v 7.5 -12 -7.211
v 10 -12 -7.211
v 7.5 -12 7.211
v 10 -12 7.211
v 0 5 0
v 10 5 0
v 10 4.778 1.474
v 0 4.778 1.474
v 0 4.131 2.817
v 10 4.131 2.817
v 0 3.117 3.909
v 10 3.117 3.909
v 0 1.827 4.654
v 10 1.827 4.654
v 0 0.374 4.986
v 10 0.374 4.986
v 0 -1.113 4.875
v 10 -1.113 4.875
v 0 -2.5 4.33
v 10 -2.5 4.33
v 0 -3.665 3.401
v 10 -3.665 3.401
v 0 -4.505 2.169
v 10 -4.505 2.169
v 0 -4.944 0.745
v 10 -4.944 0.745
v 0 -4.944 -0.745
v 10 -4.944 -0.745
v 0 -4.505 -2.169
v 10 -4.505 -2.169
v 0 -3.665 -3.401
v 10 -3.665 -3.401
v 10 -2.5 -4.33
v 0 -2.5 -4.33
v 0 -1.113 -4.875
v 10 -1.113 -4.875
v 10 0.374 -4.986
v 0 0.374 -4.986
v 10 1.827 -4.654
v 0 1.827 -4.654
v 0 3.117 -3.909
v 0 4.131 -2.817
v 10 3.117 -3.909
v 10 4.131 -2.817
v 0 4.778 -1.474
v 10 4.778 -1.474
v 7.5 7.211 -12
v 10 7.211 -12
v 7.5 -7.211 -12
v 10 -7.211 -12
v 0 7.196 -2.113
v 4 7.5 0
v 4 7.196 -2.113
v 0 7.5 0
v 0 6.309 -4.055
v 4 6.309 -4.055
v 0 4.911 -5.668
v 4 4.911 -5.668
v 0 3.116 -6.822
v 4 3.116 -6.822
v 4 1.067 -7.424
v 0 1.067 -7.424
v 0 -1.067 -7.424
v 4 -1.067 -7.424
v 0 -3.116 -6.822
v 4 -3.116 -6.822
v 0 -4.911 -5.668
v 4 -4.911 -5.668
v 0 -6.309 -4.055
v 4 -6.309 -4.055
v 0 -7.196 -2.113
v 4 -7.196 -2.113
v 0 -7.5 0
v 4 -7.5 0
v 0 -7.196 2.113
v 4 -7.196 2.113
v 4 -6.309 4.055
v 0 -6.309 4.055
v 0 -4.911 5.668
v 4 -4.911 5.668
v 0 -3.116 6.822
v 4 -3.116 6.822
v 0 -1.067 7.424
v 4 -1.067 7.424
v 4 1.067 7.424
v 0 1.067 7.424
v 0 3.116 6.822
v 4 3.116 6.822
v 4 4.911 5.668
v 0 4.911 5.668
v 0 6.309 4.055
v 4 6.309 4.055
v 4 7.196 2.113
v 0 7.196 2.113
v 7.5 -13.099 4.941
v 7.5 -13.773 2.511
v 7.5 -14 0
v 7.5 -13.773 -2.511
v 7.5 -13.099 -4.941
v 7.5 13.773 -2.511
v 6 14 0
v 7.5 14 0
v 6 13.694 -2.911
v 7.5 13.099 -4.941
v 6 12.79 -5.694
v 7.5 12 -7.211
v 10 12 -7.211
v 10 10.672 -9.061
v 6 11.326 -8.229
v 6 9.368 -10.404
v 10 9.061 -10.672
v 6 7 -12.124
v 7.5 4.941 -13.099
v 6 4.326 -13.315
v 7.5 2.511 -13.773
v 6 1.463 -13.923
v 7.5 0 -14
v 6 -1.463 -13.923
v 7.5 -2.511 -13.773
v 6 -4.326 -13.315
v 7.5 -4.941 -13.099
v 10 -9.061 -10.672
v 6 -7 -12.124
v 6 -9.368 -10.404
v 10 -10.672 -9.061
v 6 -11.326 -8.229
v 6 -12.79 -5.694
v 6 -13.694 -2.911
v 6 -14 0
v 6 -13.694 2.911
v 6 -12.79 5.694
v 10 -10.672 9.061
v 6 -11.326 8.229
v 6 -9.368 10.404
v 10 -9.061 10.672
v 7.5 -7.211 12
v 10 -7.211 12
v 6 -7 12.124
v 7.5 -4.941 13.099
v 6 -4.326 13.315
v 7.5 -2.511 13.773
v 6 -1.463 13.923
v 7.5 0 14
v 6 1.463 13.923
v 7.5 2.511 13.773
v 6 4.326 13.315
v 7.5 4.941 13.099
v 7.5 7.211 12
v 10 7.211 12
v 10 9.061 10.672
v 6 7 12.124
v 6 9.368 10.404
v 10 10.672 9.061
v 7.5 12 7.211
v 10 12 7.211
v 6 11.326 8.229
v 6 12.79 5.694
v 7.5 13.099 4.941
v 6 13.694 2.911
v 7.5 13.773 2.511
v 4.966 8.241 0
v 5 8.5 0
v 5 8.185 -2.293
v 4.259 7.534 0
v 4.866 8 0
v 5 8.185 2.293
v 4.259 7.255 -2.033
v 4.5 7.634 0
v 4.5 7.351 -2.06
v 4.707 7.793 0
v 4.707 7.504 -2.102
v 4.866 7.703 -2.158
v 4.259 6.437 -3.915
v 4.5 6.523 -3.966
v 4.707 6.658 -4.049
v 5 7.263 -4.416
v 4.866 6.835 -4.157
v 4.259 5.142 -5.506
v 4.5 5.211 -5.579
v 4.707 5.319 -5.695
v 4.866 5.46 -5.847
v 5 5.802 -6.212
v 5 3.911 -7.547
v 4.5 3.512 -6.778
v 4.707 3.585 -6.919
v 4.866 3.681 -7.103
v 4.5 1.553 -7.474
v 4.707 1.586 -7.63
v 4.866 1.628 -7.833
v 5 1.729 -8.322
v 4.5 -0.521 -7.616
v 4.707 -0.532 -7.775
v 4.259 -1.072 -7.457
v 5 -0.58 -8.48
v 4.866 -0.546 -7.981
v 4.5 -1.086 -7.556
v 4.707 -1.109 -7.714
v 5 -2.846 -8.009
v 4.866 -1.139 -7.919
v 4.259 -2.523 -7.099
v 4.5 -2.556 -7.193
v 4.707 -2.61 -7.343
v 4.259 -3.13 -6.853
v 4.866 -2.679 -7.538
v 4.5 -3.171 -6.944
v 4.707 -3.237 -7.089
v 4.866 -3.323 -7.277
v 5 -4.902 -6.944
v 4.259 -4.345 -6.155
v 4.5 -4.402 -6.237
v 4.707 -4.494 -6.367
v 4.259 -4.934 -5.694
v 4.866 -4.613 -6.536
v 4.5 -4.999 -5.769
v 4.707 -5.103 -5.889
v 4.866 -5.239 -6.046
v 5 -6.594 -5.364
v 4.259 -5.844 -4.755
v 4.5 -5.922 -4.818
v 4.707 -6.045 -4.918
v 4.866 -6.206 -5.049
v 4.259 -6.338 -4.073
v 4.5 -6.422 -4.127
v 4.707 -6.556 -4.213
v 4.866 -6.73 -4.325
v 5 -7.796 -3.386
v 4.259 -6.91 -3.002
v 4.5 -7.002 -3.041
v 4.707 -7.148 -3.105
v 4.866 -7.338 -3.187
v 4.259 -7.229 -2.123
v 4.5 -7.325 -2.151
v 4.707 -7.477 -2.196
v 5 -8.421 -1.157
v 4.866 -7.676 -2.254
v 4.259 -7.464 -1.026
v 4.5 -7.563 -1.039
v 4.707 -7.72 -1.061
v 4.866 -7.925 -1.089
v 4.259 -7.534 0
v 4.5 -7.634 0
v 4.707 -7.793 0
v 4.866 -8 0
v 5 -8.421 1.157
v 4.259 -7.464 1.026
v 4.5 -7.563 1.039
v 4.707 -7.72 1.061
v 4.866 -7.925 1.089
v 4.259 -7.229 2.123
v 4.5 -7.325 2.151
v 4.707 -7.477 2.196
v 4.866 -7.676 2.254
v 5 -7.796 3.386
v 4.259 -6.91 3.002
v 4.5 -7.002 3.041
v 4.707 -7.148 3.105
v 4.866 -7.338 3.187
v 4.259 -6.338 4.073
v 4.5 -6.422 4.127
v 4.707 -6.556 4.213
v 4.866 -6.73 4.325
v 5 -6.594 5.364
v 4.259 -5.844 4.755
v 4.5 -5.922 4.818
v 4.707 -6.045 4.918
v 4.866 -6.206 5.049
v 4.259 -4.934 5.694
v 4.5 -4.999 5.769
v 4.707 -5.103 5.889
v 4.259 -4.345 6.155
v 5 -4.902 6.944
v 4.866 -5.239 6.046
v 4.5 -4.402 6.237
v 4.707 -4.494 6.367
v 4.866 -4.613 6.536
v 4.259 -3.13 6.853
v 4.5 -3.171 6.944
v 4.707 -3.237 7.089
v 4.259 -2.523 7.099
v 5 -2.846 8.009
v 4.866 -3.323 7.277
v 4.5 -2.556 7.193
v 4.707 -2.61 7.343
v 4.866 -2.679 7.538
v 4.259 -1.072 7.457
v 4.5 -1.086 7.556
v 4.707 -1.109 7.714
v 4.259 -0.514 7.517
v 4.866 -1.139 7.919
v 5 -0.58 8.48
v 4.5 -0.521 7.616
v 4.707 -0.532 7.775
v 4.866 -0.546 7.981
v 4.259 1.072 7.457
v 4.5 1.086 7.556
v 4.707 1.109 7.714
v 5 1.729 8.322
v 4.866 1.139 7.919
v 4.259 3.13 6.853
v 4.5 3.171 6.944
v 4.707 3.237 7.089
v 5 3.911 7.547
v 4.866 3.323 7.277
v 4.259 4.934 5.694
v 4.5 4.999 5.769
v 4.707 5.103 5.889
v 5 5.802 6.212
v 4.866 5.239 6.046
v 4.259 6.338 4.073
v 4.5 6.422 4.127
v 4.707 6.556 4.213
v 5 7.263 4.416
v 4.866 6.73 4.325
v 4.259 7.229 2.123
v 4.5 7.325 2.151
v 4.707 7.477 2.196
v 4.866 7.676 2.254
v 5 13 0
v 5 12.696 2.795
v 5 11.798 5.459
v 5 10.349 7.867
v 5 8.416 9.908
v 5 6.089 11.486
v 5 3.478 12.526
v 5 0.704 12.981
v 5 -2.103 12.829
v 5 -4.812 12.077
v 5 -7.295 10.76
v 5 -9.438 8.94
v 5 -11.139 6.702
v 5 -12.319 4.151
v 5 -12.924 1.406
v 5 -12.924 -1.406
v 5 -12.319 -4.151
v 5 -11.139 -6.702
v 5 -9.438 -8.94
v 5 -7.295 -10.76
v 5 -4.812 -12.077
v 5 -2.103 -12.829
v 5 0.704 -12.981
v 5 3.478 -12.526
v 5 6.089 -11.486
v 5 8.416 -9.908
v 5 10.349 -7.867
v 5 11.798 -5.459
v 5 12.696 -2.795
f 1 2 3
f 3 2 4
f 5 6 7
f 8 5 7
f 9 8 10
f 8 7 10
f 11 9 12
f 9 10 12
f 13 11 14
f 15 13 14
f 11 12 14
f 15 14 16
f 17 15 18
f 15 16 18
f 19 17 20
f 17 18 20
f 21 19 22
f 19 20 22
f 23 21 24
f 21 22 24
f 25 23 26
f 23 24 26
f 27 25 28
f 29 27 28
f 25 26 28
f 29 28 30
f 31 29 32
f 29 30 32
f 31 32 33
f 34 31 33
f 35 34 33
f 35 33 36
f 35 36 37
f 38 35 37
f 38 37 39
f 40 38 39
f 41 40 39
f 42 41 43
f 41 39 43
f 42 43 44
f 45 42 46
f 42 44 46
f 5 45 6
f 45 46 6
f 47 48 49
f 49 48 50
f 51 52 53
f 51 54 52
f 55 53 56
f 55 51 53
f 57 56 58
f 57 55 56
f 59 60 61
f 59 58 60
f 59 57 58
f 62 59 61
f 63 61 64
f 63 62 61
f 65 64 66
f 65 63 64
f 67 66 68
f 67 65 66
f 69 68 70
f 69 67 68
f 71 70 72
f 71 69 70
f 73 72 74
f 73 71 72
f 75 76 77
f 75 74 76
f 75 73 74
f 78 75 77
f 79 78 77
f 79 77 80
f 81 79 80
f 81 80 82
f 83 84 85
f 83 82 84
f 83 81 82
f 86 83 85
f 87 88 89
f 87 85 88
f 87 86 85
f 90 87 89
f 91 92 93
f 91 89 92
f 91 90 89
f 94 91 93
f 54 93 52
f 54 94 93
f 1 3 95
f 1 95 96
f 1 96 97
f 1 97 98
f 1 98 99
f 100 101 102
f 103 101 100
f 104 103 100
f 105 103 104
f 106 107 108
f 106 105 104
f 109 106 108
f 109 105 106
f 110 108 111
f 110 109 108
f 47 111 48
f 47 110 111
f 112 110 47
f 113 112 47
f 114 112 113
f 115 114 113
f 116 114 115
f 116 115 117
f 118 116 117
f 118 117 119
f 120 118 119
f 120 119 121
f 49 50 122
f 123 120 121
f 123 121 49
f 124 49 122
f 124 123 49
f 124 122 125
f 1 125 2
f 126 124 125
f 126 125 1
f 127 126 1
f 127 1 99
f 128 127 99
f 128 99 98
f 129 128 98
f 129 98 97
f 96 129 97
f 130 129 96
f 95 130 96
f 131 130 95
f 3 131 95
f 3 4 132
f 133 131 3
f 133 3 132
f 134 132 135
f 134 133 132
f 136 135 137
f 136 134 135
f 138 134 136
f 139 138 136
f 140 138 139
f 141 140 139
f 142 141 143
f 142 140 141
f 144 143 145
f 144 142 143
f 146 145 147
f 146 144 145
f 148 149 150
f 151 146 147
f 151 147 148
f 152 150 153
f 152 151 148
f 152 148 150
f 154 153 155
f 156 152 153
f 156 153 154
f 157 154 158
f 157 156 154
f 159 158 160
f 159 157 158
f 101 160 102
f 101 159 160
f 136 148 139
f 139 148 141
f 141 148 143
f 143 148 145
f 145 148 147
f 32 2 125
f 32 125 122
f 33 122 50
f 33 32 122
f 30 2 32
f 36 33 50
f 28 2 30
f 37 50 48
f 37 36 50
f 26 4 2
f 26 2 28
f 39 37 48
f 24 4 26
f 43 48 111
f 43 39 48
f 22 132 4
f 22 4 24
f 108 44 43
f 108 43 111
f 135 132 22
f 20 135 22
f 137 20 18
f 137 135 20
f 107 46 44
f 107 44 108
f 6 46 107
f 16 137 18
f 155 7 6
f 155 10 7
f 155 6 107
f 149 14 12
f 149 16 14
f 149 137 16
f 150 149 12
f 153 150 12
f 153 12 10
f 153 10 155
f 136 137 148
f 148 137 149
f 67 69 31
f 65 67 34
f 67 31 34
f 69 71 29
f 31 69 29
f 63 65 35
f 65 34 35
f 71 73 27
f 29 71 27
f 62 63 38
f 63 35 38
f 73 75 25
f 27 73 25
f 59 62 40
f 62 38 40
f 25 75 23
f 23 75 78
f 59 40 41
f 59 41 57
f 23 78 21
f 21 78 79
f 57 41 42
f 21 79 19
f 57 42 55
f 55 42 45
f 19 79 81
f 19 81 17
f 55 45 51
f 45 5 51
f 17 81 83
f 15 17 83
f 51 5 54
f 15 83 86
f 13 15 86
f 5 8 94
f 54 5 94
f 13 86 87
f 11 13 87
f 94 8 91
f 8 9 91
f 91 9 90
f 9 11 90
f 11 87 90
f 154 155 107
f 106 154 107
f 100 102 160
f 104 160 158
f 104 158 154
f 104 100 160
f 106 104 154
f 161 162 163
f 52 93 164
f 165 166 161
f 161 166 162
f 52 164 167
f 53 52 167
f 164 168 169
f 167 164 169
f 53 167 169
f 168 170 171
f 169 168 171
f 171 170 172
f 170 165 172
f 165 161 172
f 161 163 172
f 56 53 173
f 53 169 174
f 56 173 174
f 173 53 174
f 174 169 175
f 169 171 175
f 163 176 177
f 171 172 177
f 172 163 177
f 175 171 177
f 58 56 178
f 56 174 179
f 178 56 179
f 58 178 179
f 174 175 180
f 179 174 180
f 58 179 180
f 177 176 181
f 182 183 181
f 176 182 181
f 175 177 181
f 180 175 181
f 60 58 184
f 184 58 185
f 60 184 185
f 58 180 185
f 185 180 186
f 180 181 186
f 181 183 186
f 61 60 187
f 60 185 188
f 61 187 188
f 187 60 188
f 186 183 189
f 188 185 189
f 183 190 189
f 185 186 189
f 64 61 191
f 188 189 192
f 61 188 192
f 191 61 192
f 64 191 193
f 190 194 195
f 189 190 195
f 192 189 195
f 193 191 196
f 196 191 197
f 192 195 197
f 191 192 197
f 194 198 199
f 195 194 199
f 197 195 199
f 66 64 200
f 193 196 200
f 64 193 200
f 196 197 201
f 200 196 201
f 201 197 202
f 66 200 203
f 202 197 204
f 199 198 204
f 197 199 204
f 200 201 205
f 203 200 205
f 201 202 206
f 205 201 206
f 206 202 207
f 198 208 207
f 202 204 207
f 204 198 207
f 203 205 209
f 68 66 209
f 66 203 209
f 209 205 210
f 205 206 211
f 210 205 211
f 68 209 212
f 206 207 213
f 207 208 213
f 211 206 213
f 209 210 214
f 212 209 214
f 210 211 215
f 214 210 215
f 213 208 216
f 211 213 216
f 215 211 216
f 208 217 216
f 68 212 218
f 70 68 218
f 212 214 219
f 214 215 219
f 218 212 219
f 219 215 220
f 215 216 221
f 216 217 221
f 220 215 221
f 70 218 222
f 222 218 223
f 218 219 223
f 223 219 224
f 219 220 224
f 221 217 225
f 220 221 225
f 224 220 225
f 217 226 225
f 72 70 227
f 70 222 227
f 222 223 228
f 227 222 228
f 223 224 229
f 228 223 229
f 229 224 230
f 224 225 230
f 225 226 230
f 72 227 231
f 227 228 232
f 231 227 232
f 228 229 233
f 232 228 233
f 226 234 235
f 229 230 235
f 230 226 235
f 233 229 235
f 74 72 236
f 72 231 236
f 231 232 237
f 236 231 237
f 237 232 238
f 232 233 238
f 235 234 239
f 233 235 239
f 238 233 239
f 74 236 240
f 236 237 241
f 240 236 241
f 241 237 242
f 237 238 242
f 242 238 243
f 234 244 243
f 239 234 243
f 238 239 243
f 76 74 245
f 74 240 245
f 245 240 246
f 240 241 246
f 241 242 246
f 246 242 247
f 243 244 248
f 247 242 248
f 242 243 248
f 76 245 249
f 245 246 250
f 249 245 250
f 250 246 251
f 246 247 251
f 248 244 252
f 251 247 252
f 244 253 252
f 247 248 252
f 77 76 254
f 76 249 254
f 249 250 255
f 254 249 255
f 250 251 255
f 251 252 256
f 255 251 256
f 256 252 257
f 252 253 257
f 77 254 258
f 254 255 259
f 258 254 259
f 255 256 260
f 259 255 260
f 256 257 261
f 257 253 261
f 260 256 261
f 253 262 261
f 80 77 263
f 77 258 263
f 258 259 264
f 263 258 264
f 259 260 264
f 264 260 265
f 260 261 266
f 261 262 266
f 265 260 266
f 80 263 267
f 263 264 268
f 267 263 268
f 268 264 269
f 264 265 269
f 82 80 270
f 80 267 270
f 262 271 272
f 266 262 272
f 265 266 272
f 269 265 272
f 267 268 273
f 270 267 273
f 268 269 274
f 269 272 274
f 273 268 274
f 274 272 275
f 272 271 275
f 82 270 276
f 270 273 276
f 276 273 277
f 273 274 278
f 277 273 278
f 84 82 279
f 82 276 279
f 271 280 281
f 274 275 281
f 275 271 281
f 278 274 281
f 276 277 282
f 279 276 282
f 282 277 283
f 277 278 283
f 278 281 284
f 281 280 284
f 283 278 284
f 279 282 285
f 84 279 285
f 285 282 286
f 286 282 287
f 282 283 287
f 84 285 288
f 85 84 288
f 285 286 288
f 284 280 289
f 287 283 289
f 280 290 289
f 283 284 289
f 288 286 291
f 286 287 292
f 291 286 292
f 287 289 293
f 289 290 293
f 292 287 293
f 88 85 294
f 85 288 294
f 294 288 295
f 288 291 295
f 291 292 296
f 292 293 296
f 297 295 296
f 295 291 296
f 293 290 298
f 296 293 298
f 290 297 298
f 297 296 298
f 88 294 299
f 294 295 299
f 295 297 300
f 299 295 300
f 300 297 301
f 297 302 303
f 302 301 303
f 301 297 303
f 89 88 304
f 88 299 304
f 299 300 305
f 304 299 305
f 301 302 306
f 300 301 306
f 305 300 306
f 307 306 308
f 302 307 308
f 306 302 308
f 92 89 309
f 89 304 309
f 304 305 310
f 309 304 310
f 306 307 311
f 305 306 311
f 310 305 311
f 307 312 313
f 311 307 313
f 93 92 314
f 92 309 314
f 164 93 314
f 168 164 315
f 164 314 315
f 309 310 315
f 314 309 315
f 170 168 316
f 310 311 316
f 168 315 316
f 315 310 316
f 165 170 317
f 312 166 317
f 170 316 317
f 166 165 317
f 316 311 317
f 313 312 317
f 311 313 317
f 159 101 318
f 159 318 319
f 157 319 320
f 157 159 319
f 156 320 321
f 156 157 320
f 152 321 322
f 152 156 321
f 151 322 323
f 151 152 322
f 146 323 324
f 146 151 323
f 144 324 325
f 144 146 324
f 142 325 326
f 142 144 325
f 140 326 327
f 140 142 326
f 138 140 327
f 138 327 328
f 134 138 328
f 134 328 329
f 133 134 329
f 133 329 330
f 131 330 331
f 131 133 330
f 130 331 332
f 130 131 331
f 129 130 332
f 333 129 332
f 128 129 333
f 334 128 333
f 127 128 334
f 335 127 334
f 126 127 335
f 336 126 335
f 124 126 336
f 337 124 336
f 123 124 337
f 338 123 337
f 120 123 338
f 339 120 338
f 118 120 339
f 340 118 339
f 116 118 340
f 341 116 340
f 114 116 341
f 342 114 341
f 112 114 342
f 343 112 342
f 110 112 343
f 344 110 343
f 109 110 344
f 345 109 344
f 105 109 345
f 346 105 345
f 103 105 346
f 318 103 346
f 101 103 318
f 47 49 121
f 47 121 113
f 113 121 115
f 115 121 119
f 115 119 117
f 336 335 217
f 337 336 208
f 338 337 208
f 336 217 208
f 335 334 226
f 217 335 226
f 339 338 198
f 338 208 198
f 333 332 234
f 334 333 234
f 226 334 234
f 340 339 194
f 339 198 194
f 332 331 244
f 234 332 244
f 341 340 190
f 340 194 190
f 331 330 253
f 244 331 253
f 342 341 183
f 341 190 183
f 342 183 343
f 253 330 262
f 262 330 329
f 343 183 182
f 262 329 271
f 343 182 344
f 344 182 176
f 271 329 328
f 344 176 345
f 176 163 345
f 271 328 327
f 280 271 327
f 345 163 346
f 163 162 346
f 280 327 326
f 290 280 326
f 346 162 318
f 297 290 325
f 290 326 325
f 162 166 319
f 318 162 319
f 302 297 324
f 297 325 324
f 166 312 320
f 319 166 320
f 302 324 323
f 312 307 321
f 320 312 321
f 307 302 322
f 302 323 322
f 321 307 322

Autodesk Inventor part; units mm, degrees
ref_plane "YZ Plane" through (0, 0, 0) normal (1, 0, 0) x (0, 1, 0)
ref_plane "XZ Plane" through (0, 0, 0) normal (0, 1, 0) x (-1, 0, 0)
ref_plane "XY Plane" through (0, 0, 0) normal (0, 0, 1) x (1, 0, 0)
sketch "Boceto1" plane through (0, 0, 0) normal (0, 0, 1) x (1, 0, 0)
  line L0 (0, 0) -> (11.3785, 0)
  line L1 (0, 5) -> (10, 5)
  line L2 (10, 5) -> (10, 14)
  line L3 (10, 14) -> (5, 14)
  line L4 (5, 14) -> (5, 7.5)
  line L5 (5, 7.5) -> (0, 7.5)
  line L6 (0, 7.5) -> (0, 5)
  dimension "d0" = 5
  dimension "d1" = 5
  dimension "d3" = 28
  dimension "d4" = 15
  dimension "d5" = 10
revolve "Revolución1" add sketch "Boceto1" angle 360 about axis through (0, 0, 0) along (1, 0, 0)
fillet "Empalme1" radius 1 1 edges at (5, -7.5, 0)
chamfer "Chaflán1" distance 1 angle 45 1 edges at (5, -14, 0)
sketch "Boceto2" plane through (10, 0, 0) normal (1, 0, 0) x (0, 0, -1)
  circle A0 centre (0, 0) radius 14 projected
  line L0 (-12, 12) -> (12, 12)
  line L1 (12, 12) -> (12, -12)
  line L2 (12, -12) -> (-12, -12)
  line L3 (-12, -12) -> (-12, 12)
  point P0 (12, 0)
  point P1 (0, 12)
  point P2 (-7.2111, 12)
  point P3 (7.2111, 12)
  point P4 (12, 7.2111)
  point P5 (12, -7.2111)
  point P6 (-12, -7.2111)
  point P7 (-12, 7.2111)
  point P8 (7.2111, -12)
  point P9 (-7.2111, -12)
  dimension "d11" = 24
  dimension "d12" = 24
extrude "Extrusión1" cut sketch "Boceto2" against normal blind 2.5 contours A0 L1 | L0 A0 | A0 L2 | L3 A0
thread "Rosca1" size "M10x1.5" class "6H" standard "ANSI Metric M Profile" length 20
properties part number "tuerca_manzana_1"
